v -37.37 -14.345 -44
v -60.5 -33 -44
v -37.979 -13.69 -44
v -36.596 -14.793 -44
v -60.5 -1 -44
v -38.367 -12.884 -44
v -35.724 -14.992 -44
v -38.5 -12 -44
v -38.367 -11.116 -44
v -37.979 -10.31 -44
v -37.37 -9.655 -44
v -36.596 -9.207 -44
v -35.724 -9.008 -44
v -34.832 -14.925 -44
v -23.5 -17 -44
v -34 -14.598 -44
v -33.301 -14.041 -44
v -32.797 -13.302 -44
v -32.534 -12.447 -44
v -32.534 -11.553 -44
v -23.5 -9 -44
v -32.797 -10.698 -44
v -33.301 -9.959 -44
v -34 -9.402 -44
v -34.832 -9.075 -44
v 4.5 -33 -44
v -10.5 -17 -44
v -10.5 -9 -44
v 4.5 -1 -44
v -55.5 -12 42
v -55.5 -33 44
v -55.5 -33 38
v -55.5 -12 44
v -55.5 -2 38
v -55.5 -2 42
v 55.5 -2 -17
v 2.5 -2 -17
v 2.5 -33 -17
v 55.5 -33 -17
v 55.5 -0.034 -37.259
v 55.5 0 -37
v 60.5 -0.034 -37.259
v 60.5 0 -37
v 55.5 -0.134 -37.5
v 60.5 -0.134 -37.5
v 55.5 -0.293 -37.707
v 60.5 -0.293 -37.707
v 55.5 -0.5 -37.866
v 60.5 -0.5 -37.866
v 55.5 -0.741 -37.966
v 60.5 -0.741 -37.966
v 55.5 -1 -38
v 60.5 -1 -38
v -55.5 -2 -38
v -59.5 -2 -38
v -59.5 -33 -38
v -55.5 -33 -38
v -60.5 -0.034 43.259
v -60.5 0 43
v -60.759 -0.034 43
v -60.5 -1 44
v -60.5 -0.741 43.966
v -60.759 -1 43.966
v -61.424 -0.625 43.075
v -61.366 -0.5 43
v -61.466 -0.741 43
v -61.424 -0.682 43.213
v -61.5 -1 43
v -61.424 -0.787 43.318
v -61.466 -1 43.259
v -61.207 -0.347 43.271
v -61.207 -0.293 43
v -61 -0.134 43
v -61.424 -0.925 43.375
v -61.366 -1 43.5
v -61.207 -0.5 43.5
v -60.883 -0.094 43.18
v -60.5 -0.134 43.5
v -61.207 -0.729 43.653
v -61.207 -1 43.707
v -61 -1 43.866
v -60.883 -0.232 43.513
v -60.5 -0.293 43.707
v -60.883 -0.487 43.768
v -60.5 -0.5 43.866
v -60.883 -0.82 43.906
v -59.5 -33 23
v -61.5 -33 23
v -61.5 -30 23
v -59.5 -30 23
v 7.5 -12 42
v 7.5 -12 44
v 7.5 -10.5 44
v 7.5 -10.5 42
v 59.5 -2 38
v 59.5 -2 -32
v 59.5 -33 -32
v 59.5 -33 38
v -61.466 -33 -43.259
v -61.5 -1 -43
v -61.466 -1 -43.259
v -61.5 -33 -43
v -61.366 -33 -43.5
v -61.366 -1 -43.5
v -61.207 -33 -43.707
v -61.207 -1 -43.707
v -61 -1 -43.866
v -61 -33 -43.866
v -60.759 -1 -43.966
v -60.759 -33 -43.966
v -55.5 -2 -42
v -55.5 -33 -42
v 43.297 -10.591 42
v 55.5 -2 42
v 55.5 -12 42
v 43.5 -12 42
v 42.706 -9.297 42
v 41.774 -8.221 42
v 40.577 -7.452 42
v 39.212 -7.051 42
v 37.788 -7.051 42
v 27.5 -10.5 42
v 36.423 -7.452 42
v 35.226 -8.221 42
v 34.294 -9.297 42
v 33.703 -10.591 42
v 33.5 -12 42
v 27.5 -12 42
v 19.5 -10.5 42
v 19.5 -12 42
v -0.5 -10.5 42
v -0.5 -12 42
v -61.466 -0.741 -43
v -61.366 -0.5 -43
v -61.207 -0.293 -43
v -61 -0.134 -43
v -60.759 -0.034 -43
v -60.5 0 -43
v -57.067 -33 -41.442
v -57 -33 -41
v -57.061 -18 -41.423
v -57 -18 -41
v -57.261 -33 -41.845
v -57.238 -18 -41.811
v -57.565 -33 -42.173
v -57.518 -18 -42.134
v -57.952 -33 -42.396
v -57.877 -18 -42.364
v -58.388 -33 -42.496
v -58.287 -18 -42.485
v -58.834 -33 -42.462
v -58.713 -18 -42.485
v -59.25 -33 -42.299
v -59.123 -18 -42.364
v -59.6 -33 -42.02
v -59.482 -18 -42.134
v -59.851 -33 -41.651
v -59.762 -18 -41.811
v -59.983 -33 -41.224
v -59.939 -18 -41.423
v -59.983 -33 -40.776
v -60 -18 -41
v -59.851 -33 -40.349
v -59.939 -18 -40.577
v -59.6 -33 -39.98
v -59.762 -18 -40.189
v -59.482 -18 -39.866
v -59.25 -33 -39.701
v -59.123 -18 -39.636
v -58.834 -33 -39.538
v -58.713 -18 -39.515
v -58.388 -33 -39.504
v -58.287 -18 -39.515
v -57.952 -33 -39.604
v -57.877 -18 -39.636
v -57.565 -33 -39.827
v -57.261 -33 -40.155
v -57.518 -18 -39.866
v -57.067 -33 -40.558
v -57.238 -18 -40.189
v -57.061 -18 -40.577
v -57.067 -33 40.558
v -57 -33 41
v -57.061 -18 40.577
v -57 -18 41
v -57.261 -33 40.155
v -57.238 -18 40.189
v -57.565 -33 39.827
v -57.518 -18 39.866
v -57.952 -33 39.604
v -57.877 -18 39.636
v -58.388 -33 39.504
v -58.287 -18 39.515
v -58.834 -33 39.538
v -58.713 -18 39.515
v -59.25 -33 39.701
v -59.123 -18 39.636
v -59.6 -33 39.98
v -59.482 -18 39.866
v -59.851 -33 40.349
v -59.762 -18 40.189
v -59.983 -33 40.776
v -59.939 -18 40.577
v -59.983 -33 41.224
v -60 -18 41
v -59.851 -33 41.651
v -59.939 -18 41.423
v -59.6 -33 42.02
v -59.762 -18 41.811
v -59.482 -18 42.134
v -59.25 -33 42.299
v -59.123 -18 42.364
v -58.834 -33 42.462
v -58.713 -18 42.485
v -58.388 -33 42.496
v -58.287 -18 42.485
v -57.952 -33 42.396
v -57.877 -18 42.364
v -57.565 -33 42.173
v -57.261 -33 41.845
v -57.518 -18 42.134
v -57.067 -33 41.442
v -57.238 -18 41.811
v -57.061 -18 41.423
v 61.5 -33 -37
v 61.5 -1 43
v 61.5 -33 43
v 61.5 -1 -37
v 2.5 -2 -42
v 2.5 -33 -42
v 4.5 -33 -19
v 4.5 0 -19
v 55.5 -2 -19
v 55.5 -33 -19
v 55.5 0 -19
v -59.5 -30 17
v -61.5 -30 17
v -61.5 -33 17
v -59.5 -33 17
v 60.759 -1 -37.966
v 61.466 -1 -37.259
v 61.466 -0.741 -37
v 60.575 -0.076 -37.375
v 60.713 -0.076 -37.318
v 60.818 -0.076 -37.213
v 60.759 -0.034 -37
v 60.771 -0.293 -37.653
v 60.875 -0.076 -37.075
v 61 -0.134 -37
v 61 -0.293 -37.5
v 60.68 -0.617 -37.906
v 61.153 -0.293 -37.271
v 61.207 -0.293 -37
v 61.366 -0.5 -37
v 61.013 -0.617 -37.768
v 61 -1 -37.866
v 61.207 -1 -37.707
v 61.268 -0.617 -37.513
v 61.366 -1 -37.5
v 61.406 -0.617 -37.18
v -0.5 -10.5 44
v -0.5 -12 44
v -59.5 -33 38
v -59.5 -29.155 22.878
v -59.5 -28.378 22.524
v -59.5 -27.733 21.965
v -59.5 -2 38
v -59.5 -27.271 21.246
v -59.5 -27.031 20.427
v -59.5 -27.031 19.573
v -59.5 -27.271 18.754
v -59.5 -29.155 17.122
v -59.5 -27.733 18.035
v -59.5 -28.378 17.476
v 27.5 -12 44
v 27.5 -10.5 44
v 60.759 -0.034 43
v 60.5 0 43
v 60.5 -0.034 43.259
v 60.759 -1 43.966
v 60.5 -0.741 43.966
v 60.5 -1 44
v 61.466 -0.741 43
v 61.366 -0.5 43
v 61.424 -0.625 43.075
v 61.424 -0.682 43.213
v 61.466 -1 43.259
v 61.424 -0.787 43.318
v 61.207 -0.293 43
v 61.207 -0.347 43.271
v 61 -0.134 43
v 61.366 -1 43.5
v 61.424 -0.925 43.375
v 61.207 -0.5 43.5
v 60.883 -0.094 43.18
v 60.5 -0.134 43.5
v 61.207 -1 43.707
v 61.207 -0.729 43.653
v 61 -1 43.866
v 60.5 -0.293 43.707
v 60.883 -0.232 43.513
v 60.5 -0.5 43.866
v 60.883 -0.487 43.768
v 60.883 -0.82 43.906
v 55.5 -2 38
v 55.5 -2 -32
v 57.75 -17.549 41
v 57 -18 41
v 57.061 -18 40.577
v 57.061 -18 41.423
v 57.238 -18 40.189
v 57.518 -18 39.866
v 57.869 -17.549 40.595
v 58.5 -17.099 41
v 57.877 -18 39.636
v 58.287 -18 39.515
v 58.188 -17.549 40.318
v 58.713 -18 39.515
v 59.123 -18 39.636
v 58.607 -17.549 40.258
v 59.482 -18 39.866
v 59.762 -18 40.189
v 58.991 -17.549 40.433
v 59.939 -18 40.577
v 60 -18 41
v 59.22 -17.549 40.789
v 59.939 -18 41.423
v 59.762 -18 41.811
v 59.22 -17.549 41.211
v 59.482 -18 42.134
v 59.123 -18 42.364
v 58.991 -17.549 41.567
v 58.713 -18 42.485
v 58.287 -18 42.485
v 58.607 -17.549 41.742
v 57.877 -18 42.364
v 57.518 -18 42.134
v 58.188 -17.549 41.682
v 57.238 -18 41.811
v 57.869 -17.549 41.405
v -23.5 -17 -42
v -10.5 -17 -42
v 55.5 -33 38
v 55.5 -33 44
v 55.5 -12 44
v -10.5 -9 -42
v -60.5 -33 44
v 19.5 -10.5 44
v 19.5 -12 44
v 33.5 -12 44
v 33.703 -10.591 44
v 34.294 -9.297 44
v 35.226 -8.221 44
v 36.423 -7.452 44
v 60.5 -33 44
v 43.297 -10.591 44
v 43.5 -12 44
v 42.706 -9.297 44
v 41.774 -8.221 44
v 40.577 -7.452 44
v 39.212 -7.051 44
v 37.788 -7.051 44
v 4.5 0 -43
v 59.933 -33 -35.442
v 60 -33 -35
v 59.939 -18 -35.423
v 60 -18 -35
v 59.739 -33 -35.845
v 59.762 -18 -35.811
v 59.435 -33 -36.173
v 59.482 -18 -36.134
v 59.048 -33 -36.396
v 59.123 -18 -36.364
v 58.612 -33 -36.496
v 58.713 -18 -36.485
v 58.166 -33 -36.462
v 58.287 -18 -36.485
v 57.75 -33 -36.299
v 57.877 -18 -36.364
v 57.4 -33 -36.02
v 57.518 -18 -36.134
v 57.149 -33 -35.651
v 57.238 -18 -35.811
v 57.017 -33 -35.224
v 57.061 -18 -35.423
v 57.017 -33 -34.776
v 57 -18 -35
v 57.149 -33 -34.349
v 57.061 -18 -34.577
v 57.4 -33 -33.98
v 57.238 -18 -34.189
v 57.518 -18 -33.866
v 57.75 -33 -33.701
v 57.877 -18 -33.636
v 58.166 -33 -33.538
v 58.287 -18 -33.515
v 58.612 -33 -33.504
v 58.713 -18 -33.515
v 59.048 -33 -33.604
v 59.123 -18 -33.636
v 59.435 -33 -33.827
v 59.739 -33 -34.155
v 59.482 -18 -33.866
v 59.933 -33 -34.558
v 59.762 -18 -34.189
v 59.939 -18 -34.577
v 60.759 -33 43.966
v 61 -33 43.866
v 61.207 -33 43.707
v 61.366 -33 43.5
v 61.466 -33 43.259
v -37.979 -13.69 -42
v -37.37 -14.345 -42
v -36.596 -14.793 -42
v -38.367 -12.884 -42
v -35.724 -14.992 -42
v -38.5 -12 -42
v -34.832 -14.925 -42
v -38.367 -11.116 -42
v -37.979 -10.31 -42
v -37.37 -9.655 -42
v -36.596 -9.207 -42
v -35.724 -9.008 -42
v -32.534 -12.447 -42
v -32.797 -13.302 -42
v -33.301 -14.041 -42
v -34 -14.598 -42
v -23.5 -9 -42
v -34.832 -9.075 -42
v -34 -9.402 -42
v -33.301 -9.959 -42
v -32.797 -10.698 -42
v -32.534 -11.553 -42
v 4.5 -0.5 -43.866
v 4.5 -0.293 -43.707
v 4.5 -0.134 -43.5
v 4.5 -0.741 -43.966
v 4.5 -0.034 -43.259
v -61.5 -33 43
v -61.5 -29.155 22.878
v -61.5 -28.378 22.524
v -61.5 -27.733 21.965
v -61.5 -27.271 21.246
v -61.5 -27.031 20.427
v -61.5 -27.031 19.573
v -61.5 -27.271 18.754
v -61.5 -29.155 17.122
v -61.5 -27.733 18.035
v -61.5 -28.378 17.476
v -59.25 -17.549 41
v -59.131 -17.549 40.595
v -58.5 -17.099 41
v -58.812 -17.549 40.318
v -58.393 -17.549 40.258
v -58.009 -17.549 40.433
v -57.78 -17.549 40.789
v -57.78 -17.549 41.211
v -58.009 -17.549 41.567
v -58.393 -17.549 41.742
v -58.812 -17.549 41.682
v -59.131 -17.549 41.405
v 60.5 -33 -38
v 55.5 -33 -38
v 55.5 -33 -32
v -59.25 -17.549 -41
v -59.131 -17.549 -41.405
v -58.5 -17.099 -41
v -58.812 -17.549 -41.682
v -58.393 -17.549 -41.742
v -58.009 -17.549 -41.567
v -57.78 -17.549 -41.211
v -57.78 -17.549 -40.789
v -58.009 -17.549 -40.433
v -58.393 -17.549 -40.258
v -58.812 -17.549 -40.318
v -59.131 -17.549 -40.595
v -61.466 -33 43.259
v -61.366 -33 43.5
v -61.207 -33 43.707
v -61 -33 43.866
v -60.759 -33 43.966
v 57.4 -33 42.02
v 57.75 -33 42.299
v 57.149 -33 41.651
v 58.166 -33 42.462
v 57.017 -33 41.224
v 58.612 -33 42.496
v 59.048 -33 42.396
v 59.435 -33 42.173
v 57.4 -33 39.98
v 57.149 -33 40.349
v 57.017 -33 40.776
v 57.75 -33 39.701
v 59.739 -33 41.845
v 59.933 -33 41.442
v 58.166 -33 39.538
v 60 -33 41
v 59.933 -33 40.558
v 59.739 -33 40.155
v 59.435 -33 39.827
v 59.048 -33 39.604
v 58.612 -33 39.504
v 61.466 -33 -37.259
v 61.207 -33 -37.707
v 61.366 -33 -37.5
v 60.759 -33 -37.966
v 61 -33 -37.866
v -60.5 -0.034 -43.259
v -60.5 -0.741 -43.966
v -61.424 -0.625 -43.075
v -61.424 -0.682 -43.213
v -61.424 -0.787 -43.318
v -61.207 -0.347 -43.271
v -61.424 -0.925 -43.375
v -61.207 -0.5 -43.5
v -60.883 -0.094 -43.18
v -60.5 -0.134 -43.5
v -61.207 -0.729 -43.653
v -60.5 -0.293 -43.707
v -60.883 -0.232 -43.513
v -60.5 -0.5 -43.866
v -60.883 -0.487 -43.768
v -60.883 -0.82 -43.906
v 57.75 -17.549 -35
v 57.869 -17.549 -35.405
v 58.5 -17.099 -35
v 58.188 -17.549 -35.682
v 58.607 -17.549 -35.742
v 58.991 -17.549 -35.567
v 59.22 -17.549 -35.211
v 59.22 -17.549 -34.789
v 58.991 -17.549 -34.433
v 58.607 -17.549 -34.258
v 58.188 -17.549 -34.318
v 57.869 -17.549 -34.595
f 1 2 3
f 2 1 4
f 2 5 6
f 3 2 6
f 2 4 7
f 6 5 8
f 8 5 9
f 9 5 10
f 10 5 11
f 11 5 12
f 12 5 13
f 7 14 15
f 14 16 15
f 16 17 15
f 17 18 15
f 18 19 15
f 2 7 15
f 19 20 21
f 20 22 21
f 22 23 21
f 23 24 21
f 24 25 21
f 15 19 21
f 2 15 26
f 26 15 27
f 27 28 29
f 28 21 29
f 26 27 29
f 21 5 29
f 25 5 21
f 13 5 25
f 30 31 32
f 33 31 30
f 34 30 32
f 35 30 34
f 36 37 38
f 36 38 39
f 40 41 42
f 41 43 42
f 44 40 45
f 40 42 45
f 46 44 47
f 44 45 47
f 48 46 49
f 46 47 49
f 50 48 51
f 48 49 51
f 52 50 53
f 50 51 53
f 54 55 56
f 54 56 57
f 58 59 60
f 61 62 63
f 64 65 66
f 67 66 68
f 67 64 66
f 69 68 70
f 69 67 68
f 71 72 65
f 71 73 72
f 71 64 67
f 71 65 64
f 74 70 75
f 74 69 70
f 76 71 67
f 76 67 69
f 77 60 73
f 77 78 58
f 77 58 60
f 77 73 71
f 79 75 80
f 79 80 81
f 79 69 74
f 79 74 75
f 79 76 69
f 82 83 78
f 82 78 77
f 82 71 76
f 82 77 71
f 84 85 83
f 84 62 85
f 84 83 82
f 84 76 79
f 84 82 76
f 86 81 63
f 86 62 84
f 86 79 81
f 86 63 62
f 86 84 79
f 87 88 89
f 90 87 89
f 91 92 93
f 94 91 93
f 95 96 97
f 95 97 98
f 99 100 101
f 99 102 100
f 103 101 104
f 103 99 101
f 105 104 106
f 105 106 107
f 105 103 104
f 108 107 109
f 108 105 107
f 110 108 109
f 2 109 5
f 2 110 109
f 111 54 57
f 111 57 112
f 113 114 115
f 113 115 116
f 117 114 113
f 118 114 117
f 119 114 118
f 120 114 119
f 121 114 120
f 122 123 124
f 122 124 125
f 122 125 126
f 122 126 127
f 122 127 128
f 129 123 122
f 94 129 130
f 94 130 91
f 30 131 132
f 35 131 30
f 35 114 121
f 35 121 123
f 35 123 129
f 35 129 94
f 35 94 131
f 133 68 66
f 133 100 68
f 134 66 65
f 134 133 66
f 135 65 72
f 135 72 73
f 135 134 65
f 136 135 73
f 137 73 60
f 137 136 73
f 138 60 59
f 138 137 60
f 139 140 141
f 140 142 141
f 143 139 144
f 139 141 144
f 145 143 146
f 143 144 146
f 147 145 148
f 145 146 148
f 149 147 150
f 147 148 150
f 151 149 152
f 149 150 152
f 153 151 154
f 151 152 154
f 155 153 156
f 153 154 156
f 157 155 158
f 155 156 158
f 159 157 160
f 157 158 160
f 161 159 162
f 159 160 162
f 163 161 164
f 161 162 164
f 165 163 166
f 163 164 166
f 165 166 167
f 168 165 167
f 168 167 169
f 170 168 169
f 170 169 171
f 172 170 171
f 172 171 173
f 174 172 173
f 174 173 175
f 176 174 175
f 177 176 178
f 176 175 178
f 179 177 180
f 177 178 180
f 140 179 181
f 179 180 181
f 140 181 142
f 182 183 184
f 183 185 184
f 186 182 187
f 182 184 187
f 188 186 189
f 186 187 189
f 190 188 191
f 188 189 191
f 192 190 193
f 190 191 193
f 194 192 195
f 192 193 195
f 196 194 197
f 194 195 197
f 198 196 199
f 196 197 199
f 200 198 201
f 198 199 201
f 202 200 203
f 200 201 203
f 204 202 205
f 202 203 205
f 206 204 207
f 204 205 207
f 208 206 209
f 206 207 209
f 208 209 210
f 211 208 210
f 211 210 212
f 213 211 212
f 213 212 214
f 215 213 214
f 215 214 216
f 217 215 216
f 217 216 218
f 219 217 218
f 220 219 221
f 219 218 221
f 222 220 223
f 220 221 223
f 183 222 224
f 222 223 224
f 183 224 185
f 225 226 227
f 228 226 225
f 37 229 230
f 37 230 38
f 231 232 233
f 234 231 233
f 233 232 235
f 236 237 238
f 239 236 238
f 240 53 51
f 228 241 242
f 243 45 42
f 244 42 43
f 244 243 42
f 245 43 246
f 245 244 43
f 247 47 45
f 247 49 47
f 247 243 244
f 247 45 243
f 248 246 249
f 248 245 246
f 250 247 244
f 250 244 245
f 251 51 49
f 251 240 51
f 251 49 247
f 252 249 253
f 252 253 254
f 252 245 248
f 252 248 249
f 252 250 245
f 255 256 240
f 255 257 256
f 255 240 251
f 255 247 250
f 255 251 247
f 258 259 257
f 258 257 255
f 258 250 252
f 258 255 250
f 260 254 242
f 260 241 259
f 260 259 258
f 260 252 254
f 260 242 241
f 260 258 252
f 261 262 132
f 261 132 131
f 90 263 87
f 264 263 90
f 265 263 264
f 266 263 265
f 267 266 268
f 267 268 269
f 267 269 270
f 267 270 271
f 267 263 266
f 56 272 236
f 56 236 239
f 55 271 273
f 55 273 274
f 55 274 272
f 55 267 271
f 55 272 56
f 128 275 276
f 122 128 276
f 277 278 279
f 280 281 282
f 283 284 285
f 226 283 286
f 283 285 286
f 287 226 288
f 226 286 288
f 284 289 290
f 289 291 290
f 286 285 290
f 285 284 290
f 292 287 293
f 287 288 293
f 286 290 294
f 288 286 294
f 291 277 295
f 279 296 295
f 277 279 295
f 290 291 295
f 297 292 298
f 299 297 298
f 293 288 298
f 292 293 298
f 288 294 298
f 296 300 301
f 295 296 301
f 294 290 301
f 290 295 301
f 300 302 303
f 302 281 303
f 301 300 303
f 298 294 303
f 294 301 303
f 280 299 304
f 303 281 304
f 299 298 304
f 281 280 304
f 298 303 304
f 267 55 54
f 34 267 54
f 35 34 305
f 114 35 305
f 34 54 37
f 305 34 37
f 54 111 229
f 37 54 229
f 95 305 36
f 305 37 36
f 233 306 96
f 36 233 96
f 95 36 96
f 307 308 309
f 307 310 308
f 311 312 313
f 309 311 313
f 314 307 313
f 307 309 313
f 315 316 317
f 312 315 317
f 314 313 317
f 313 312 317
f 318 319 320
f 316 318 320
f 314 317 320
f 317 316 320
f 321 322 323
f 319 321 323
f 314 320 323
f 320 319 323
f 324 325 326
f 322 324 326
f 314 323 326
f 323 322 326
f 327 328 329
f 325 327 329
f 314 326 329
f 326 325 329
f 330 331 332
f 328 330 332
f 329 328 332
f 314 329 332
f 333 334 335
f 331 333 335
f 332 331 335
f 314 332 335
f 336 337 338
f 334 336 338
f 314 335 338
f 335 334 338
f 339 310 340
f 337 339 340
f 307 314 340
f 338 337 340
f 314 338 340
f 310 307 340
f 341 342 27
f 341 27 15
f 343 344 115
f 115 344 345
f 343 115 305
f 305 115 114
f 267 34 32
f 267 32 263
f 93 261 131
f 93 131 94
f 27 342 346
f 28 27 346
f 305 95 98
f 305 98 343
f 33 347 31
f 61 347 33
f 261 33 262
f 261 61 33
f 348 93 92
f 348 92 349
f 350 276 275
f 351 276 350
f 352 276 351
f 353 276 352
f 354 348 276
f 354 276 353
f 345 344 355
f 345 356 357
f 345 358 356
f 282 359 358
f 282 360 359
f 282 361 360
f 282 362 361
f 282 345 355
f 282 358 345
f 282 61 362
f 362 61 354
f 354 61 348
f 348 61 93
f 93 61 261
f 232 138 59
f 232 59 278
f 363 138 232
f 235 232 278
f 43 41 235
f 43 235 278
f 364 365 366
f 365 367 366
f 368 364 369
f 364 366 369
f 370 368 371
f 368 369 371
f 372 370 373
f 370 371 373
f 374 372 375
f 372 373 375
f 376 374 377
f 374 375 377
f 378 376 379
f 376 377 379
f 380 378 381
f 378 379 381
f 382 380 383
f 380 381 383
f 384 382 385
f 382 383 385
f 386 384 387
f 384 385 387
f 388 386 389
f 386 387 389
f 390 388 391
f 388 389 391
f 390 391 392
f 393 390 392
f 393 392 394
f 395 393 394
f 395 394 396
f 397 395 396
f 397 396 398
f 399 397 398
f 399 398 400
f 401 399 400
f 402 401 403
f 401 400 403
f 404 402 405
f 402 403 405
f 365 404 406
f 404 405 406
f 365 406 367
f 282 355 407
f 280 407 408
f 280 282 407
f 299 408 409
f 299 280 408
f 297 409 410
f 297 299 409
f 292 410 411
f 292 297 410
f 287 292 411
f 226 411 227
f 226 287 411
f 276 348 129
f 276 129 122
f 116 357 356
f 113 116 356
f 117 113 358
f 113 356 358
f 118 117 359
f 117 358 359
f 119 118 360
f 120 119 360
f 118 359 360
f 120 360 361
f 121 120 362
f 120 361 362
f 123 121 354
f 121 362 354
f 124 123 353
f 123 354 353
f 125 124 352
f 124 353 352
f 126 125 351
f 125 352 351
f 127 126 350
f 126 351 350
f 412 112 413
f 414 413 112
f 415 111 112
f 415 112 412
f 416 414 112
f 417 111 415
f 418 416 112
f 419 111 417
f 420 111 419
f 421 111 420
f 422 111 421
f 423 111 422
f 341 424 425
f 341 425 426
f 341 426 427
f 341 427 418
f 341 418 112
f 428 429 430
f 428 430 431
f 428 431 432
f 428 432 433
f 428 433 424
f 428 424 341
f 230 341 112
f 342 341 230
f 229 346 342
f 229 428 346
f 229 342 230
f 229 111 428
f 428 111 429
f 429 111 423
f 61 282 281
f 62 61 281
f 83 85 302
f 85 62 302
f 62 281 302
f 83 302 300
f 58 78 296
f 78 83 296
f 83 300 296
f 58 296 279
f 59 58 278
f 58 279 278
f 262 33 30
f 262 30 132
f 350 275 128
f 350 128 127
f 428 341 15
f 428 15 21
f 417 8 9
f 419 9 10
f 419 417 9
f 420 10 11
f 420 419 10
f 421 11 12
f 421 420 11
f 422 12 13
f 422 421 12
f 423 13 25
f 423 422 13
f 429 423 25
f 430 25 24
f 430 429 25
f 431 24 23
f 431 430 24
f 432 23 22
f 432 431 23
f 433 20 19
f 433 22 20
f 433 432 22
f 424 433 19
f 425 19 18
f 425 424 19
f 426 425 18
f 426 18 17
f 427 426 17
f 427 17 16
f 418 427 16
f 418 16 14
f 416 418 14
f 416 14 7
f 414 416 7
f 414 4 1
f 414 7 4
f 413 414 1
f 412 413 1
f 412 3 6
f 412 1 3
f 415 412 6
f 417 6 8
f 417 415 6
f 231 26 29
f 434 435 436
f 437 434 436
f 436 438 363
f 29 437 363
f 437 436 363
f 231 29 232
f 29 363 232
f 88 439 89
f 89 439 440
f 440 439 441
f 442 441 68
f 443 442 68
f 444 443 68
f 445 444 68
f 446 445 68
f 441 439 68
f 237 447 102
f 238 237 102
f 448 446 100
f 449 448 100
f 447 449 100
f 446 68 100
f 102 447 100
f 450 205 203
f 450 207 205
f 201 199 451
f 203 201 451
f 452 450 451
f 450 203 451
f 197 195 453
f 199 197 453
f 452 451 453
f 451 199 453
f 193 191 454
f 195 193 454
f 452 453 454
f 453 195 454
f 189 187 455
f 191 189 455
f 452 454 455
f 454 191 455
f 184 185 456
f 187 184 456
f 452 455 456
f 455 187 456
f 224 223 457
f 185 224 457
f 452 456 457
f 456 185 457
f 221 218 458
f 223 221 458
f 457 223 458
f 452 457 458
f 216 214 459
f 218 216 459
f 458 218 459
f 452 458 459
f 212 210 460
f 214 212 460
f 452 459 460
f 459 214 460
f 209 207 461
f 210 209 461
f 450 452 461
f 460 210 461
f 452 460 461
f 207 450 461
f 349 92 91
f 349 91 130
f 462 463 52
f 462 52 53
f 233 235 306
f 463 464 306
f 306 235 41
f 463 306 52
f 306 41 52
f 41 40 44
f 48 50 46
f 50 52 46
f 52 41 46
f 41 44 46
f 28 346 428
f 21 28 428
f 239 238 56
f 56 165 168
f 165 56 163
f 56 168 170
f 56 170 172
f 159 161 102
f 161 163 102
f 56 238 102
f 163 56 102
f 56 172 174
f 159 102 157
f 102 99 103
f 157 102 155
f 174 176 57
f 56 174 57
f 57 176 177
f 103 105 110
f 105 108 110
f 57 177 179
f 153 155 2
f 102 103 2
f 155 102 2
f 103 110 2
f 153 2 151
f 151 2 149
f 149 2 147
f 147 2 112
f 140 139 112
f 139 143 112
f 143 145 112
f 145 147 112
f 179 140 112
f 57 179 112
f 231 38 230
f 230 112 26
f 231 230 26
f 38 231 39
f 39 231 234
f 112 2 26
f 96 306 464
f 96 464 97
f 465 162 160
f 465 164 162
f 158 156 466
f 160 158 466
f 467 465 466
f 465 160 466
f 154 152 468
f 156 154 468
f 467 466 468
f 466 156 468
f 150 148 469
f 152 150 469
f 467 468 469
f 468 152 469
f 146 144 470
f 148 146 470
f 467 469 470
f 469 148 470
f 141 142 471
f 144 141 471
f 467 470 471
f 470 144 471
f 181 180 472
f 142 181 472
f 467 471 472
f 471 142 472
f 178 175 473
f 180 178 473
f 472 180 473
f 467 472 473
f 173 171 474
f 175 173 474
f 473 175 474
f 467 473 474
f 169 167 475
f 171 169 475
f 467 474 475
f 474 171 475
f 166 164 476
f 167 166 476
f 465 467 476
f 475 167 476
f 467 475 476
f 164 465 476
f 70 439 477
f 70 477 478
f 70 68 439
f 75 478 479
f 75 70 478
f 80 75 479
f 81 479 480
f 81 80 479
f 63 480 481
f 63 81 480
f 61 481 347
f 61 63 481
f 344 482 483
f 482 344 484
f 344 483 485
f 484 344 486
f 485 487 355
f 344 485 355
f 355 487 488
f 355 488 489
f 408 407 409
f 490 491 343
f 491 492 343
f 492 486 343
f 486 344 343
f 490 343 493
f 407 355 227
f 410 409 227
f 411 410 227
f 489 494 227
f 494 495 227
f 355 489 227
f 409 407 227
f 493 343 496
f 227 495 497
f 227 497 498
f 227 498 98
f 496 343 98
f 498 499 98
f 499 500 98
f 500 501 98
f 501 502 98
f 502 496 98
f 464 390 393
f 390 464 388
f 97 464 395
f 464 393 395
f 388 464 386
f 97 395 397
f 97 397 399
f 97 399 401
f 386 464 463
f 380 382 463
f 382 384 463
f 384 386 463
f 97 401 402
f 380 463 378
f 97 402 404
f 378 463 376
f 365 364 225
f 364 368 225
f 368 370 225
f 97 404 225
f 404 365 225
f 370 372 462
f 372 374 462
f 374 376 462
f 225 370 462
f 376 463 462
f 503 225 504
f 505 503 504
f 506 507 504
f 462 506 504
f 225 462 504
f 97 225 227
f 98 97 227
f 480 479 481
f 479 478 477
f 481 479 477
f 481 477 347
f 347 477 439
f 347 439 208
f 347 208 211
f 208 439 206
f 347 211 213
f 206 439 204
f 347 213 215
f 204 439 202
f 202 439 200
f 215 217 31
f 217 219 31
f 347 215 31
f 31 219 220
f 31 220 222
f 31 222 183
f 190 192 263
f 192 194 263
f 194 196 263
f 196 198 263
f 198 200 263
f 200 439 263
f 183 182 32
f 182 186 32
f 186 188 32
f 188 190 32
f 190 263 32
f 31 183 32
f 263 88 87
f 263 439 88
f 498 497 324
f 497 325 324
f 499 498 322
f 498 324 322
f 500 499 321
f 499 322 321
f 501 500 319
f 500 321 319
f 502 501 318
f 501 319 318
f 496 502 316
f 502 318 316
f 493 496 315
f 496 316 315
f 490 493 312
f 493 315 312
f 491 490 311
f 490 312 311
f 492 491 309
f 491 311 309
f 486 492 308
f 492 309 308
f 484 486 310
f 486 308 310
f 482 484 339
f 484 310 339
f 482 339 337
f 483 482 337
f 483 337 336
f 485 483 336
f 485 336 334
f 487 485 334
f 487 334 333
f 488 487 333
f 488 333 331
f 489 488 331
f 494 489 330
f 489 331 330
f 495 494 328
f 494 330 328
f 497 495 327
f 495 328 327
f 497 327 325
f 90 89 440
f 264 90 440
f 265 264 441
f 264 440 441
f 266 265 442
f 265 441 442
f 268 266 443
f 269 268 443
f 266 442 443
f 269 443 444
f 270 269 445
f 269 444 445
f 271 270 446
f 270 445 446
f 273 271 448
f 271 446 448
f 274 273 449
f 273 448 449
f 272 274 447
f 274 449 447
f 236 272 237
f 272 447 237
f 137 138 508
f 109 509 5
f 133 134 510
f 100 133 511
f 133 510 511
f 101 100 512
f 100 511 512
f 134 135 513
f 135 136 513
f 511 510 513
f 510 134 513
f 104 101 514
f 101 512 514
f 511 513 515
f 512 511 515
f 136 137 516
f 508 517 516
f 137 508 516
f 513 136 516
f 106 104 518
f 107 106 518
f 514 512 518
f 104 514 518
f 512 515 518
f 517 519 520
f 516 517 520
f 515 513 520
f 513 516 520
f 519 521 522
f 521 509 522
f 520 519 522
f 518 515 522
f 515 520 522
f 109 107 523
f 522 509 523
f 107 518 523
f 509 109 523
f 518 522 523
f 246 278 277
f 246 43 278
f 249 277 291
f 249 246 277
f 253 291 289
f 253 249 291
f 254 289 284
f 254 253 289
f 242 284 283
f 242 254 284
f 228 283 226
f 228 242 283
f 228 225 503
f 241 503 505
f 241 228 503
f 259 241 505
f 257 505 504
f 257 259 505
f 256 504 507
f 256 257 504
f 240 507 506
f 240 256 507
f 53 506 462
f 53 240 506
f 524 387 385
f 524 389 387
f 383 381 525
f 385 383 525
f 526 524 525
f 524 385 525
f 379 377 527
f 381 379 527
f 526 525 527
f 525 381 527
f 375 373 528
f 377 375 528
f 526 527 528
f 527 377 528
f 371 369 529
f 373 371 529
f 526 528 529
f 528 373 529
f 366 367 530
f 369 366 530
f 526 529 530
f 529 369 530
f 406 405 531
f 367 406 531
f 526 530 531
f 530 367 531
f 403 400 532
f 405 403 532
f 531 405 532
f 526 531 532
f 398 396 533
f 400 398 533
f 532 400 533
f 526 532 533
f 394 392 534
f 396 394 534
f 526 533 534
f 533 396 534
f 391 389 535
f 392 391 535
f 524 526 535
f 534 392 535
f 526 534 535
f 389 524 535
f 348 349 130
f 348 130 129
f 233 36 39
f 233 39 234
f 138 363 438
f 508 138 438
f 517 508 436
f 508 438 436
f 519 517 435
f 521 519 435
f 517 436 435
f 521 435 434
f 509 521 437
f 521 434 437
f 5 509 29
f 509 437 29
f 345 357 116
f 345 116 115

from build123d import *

# Parameters (mm, degrees)
SKETCH2_W                 = 123
SKETCH2_H                 = 88
BOSS_EXTRUDE1_DEPTH       = 2
SKETCH3_W                 = 6
SKETCH3_H                 = 6
CUT_EXTRUDE1_DEPTH        = 2
BOSS_EXTRUDE2_DEPTH       = 33
CUT_EXTRUDE2_DEPTH        = 113.317629961
CUT_EXTRUDE2_DEPTH_BACK   = 2
SKETCH5_W                 = 13
SKETCH5_H                 = 8
SKETCH5_R                 = 3
SKETCH6_W                 = 111
SKETCH6_H                 = 21
CUT_EXTRUDE3_DEPTH        = 2
SKETCH7_W                 = 8
SKETCH7_H                 = 1.5
CUT_EXTRUDE4_DEPTH        = 2
F_3_0MM_DOWEL_HOLE2_D     = 3
F_3_0MM_DOWEL_HOLE2_DEPTH = 15
F_3_0MM_DOWEL_HOLE2_TIP   = 0.901290929
CUT_EXTRUDE10_DEPTH       = 2
FILLET1_R                 = 1


with BuildPart() as part:
    # Sketch2 → Boss-Extrude1 (new body)
    with BuildSketch(Plane(origin=(0, 0, 0), x_dir=(1, 0, 0), z_dir=(0, 1, 0))):
        Rectangle(SKETCH2_W, SKETCH2_H)
    extrude(amount=-BOSS_EXTRUDE1_DEPTH)

    # Sketch3 → Cut-Extrude1 (cut)
    with BuildSketch(Plane(origin=(0, 0, 0), x_dir=(1, 0, 0), z_dir=(0, 1, 0))):
        Polygon((55.5, 38), (55.5, 44), (4.5, 44), (4.5, 19), (55.5, 19), align=None)
        with Locations((58.5, 41)):
            Rectangle(SKETCH3_W, SKETCH3_H)
    extrude(amount=-CUT_EXTRUDE1_DEPTH, mode=Mode.SUBTRACT)

    # Sketch4 → Boss-Extrude2 (add)
    with BuildSketch(Plane(origin=(0, 0, 0), x_dir=(1, 0, 0), z_dir=(0, 1, 0))):
        Polygon((59.5, -38), (55.5, -38), (55.5, -42), (-55.5, -42), (-55.5, -38), (-59.5, -38), (-59.5, 38), (-55.5, 38), (-55.5, 42), (2.5, 42), (2.5, 17), (55.5, 17), (55.5, 19), (4.5, 19), (4.5, 44), (-61.5, 44), (-61.5, -44), (61.5, -44), (61.5, 38), (55.5, 38), (55.5, 32), (59.5, 32), align=None)
    extrude(amount=-BOSS_EXTRUDE2_DEPTH)

    # Sketch5 → Cut-Extrude2 (cut, two sides: drawn at the far end of the back side and taken through both)
    with BuildSketch(Plane(origin=(0, 0, -44), x_dir=(-1, 0, 0), z_dir=(0, 0, -1)).offset(-CUT_EXTRUDE2_DEPTH_BACK)):
        with Locations((17, -13)):
            Rectangle(SKETCH5_W, SKETCH5_H)
        with Locations((35.5, -12)):
            Circle(SKETCH5_R)
    extrude(amount=CUT_EXTRUDE2_DEPTH + CUT_EXTRUDE2_DEPTH_BACK, mode=Mode.SUBTRACT)

    # Sketch6 → Cut-Extrude3 (cut)
    with BuildSketch(Plane.XY.offset(44)):
        with Locations((0, -22.5)):
            Rectangle(SKETCH6_W, SKETCH6_H)
    extrude(amount=-CUT_EXTRUDE3_DEPTH, mode=Mode.SUBTRACT)

    # Sketch7 → Cut-Extrude4 (cut)
    with BuildSketch(Plane.XY.offset(44)):
        with BuildLine():
            Line((33.5, -12), (43.5, -12))
            ThreePointArc((43.5, -12), (38.5, -7), (33.5, -12))
        make_face()
        with Locations((3.5, -11.25)):
            Rectangle(SKETCH7_W, SKETCH7_H)
        with Locations((23.5, -11.25)):
            Rectangle(SKETCH7_W, SKETCH7_H)
    extrude(amount=-CUT_EXTRUDE4_DEPTH, mode=Mode.SUBTRACT)

    # Ø3.0mm Dowel Hole2
    with Locations(Plane(origin=(0, -33, 0), x_dir=(-1, 0, 0), z_dir=(0, -1, 0))):
        with Locations((58.5, -41), (58.5, 41), (-58.5, 35), (-58.5, -41)):
            Hole(F_3_0MM_DOWEL_HOLE2_D / 2, depth=F_3_0MM_DOWEL_HOLE2_DEPTH)
            with Locations((0, 0, -(F_3_0MM_DOWEL_HOLE2_DEPTH + F_3_0MM_DOWEL_HOLE2_TIP / 2))):  # 118° drill point
                Cone(0, F_3_0MM_DOWEL_HOLE2_D / 2, F_3_0MM_DOWEL_HOLE2_TIP, mode=Mode.SUBTRACT)

    # Sketch15 → Cut-Extrude10 (cut)
    with BuildSketch(Plane.ZY.offset(61.5)):
        with BuildLine():
            ThreePointArc((23, -30), (20, -27), (17, -30))
            Line((17, -30), (17, -33))
            Line((17, -33), (23, -33))
            Line((23, -33), (23, -30))
        make_face()
    extrude(amount=-CUT_EXTRUDE10_DEPTH, mode=Mode.SUBTRACT)

    # Fillet1
    fillet1_edges = [part.edges().sort_by_distance(p)[0] for p in [
        (-28.5, 0, -44),
        (61.5, -16.5, -38),
        (58.5, 0, -38),
        (0, 0, 44),
        (-61.5, 0, 0),
        (61.5, 0, 3),
        (61.5, -16.5, 44),
        (-61.5, -16.5, 44),
        (-61.5, -16.5, -44),
    ]]
    fillet(fillet1_edges, radius=FILLET1_R)


solid = part.part
